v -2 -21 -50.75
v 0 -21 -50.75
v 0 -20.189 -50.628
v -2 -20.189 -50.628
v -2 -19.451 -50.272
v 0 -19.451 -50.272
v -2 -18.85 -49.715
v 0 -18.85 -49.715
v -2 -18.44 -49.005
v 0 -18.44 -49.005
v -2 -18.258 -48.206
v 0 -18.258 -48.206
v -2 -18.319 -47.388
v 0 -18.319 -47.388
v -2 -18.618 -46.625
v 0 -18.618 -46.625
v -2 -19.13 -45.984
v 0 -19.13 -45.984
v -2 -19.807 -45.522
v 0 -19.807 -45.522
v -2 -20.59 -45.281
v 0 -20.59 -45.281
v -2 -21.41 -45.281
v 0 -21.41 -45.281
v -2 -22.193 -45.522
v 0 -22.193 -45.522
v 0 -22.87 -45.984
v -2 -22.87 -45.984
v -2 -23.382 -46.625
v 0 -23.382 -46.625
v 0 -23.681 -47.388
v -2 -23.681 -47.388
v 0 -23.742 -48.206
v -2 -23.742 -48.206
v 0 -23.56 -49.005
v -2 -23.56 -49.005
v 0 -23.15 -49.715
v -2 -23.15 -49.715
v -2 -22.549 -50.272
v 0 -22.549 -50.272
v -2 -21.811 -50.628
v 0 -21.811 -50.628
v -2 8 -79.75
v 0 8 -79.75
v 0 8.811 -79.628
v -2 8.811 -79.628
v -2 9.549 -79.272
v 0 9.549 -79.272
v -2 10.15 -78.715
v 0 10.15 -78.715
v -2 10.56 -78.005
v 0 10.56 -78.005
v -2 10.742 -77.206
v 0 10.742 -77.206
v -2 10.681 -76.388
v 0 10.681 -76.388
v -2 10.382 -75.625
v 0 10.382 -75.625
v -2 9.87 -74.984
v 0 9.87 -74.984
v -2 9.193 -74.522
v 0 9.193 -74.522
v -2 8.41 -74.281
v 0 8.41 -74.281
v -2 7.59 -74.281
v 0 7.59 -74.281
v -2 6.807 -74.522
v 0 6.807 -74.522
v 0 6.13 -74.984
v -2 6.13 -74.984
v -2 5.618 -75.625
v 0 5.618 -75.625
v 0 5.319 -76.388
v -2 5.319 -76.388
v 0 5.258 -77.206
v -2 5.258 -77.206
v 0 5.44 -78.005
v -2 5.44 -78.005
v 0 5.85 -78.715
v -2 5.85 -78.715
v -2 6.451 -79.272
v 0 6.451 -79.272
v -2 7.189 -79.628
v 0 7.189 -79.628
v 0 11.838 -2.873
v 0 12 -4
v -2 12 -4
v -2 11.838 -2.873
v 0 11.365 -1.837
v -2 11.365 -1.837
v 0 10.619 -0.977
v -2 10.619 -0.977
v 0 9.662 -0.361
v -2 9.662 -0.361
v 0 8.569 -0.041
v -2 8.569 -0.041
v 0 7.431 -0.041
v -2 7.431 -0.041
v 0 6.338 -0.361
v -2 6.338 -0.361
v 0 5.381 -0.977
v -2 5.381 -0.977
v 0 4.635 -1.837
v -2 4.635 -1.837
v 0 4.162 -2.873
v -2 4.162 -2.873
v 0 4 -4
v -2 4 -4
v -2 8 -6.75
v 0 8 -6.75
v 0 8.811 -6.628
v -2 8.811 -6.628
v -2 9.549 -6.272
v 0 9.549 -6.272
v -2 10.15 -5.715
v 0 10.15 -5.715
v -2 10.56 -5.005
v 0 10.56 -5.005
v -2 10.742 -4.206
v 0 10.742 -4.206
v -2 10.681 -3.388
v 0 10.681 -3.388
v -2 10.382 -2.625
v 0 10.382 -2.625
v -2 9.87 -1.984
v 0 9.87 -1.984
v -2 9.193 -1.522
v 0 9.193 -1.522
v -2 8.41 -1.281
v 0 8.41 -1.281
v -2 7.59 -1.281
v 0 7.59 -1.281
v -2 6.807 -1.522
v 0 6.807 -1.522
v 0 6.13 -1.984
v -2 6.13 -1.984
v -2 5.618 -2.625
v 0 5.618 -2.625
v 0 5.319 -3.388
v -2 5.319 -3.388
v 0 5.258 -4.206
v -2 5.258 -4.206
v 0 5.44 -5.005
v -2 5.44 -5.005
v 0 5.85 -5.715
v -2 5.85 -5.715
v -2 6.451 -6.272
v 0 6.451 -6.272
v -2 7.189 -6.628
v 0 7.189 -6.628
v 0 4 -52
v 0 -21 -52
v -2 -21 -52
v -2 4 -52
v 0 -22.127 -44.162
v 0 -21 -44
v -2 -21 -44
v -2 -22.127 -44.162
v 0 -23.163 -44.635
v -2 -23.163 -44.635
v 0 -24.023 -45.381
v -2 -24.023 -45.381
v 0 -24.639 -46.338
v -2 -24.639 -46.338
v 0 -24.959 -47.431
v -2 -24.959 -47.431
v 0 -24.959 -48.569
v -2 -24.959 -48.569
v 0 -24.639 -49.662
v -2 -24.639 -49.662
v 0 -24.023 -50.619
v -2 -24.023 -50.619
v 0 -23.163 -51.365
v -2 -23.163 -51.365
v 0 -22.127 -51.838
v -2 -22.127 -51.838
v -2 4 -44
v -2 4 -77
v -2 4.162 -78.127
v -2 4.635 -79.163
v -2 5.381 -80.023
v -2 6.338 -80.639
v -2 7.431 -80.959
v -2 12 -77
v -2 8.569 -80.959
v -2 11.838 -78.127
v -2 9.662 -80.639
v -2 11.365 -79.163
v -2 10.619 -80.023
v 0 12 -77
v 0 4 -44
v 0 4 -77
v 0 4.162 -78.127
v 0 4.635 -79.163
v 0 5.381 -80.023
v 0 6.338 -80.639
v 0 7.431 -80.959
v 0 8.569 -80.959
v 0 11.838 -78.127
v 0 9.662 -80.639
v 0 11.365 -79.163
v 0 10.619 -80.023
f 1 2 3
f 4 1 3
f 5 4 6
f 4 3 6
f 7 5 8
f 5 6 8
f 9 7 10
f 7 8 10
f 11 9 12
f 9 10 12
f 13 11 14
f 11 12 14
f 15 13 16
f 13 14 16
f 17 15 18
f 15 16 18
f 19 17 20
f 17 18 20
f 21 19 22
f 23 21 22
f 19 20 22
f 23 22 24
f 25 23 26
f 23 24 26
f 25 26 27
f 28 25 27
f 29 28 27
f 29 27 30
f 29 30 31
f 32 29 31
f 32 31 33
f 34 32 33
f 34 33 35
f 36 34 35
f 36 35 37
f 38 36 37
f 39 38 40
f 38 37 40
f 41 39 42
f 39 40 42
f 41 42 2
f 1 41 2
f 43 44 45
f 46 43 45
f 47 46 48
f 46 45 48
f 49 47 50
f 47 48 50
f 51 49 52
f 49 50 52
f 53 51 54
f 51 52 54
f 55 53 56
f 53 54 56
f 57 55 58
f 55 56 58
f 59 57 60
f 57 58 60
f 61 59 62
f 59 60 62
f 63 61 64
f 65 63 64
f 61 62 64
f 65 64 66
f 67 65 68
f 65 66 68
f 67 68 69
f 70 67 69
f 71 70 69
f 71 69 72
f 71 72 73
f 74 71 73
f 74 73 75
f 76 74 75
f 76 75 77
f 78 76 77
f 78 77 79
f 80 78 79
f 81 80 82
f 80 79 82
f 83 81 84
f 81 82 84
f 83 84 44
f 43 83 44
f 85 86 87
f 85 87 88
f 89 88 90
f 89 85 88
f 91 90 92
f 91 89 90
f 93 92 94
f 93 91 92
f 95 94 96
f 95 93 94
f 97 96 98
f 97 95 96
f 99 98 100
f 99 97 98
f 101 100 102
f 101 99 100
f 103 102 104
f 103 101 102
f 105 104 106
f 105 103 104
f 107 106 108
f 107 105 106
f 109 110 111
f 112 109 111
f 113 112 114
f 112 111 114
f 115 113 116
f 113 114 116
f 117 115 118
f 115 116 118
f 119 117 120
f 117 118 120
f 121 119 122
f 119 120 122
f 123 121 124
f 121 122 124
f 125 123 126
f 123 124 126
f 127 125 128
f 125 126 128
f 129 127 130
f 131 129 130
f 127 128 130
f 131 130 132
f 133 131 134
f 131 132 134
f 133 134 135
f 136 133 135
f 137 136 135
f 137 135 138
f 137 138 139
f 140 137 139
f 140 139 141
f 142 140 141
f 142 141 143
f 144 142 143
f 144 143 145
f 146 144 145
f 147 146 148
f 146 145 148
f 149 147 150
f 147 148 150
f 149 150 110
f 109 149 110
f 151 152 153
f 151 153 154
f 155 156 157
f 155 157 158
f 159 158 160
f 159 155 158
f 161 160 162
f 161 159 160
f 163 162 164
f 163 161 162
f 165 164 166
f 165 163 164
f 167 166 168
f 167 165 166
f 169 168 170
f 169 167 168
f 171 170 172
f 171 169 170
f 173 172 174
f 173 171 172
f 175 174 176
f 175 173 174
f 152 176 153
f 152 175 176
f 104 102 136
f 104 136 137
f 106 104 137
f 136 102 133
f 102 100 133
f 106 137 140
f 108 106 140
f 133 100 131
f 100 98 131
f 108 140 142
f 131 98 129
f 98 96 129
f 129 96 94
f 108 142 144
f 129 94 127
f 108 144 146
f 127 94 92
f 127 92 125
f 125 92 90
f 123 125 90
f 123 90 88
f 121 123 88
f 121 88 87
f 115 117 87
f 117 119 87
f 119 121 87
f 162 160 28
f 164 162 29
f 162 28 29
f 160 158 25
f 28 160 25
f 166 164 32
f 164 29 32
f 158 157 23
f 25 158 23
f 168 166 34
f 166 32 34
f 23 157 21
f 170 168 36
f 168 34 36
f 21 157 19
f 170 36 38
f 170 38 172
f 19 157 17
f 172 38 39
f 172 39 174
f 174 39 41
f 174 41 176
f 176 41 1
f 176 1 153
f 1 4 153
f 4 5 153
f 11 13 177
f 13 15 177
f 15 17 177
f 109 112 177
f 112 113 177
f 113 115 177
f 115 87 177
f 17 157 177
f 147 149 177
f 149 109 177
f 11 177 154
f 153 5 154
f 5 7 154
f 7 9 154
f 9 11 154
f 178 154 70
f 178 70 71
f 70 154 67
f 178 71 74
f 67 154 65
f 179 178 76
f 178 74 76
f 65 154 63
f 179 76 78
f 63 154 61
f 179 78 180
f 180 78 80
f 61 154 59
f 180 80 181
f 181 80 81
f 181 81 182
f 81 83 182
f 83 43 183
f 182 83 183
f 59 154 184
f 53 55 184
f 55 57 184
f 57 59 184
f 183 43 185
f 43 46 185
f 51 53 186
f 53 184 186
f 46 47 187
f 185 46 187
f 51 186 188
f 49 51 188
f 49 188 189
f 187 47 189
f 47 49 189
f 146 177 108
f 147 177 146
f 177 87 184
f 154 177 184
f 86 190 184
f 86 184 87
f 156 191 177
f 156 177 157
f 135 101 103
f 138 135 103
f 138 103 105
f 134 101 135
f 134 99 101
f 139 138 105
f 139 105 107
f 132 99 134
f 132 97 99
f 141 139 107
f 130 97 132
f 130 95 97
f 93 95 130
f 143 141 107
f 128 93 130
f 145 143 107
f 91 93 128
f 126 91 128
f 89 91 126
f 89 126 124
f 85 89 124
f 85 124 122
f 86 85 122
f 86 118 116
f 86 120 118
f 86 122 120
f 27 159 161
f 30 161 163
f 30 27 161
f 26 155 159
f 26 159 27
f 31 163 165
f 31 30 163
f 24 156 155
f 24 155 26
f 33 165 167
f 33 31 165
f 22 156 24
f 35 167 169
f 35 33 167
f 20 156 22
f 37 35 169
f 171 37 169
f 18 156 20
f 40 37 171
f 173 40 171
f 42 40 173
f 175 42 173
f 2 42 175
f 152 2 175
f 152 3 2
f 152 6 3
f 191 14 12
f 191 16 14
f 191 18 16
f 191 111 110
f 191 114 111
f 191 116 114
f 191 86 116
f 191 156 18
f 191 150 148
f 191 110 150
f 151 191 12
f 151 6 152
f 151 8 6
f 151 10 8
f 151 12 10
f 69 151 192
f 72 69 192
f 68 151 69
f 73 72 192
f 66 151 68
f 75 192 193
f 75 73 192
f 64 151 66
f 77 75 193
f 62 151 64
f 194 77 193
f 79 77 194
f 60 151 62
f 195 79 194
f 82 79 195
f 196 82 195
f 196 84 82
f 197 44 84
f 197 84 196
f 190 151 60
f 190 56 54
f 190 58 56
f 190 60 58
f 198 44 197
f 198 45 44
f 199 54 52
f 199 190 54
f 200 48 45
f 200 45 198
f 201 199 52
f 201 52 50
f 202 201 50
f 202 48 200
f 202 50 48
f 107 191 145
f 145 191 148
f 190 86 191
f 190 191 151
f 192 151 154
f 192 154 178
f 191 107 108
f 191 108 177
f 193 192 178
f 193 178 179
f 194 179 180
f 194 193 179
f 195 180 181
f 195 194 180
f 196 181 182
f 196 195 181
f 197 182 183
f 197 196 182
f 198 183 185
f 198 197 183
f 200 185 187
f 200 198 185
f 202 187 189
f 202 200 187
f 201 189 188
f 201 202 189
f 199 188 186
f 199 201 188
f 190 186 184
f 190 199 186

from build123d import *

# Parameters (mm, degrees)
SKETCH1_R           = 2.75
BOSS_EXTRUDE1_DEPTH = 2


with BuildPart() as part:
    # Sketch1 → Boss-Extrude1 (new body)
    with BuildSketch(Plane(origin=(0, 0, 0), x_dir=(0, 0, -1), z_dir=(1, 0, 0))):
        with BuildLine():
            Line((4, 4), (44, 4))
            Line((44, 4), (44, -21))
            ThreePointArc((44, -21), (48, -25), (52, -21))
            Line((52, -21), (52, 4))
            Line((52, 4), (77, 4))
            ThreePointArc((77, 4), (81, 8), (77, 12))
            Line((77, 12), (4, 12))
            ThreePointArc((4, 12), (0, 8), (4, 4))
        make_face()
        with Locations((4, 8)):
            Circle(SKETCH1_R, mode=Mode.SUBTRACT)
        with Locations((77, 8)):
            Circle(SKETCH1_R, mode=Mode.SUBTRACT)
        with Locations((48, -21)):
            Circle(SKETCH1_R, mode=Mode.SUBTRACT)
    extrude(amount=-BOSS_EXTRUDE1_DEPTH)


solid = part.part
